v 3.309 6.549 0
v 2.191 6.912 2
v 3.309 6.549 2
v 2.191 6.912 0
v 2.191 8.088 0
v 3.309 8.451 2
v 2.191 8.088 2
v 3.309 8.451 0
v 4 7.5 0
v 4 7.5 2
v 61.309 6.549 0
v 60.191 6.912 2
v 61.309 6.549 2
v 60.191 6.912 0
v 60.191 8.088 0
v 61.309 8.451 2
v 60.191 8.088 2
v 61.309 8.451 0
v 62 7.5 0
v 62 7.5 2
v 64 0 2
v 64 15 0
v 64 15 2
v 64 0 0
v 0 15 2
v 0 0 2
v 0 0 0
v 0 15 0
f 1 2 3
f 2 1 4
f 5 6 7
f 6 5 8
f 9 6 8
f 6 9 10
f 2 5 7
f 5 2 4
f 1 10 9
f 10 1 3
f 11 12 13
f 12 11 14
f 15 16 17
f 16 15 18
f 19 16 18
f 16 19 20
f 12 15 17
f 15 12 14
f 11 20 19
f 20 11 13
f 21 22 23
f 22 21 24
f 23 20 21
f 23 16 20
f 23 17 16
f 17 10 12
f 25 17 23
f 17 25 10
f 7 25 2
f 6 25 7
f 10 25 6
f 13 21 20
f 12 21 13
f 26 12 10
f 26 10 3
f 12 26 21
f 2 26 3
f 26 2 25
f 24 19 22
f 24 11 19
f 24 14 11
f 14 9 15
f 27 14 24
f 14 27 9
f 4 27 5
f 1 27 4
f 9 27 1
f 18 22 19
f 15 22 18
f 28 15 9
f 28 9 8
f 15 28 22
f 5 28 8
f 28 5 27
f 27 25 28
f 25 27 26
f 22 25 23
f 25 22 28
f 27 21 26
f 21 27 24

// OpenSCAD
// Purpose: assert, strings and str() – name plate blank with parameter check.
label = "Warehouse";
w = len(label) * 6 + 10;
h = 15;
assert(w > 20, "Sign too short");
assert(is_string(label));
echo(str("Sign ", label, ": ", w, " x ", h, " mm"));
echo(chars = [for (c = label) c], upper_first = ord(label[0]) < 97);
difference() {
    cube([w, h, 2]);
    for (x = [3, w - 3]) translate([x, h / 2, -1]) cylinder(h = 4, d = 2);
}
